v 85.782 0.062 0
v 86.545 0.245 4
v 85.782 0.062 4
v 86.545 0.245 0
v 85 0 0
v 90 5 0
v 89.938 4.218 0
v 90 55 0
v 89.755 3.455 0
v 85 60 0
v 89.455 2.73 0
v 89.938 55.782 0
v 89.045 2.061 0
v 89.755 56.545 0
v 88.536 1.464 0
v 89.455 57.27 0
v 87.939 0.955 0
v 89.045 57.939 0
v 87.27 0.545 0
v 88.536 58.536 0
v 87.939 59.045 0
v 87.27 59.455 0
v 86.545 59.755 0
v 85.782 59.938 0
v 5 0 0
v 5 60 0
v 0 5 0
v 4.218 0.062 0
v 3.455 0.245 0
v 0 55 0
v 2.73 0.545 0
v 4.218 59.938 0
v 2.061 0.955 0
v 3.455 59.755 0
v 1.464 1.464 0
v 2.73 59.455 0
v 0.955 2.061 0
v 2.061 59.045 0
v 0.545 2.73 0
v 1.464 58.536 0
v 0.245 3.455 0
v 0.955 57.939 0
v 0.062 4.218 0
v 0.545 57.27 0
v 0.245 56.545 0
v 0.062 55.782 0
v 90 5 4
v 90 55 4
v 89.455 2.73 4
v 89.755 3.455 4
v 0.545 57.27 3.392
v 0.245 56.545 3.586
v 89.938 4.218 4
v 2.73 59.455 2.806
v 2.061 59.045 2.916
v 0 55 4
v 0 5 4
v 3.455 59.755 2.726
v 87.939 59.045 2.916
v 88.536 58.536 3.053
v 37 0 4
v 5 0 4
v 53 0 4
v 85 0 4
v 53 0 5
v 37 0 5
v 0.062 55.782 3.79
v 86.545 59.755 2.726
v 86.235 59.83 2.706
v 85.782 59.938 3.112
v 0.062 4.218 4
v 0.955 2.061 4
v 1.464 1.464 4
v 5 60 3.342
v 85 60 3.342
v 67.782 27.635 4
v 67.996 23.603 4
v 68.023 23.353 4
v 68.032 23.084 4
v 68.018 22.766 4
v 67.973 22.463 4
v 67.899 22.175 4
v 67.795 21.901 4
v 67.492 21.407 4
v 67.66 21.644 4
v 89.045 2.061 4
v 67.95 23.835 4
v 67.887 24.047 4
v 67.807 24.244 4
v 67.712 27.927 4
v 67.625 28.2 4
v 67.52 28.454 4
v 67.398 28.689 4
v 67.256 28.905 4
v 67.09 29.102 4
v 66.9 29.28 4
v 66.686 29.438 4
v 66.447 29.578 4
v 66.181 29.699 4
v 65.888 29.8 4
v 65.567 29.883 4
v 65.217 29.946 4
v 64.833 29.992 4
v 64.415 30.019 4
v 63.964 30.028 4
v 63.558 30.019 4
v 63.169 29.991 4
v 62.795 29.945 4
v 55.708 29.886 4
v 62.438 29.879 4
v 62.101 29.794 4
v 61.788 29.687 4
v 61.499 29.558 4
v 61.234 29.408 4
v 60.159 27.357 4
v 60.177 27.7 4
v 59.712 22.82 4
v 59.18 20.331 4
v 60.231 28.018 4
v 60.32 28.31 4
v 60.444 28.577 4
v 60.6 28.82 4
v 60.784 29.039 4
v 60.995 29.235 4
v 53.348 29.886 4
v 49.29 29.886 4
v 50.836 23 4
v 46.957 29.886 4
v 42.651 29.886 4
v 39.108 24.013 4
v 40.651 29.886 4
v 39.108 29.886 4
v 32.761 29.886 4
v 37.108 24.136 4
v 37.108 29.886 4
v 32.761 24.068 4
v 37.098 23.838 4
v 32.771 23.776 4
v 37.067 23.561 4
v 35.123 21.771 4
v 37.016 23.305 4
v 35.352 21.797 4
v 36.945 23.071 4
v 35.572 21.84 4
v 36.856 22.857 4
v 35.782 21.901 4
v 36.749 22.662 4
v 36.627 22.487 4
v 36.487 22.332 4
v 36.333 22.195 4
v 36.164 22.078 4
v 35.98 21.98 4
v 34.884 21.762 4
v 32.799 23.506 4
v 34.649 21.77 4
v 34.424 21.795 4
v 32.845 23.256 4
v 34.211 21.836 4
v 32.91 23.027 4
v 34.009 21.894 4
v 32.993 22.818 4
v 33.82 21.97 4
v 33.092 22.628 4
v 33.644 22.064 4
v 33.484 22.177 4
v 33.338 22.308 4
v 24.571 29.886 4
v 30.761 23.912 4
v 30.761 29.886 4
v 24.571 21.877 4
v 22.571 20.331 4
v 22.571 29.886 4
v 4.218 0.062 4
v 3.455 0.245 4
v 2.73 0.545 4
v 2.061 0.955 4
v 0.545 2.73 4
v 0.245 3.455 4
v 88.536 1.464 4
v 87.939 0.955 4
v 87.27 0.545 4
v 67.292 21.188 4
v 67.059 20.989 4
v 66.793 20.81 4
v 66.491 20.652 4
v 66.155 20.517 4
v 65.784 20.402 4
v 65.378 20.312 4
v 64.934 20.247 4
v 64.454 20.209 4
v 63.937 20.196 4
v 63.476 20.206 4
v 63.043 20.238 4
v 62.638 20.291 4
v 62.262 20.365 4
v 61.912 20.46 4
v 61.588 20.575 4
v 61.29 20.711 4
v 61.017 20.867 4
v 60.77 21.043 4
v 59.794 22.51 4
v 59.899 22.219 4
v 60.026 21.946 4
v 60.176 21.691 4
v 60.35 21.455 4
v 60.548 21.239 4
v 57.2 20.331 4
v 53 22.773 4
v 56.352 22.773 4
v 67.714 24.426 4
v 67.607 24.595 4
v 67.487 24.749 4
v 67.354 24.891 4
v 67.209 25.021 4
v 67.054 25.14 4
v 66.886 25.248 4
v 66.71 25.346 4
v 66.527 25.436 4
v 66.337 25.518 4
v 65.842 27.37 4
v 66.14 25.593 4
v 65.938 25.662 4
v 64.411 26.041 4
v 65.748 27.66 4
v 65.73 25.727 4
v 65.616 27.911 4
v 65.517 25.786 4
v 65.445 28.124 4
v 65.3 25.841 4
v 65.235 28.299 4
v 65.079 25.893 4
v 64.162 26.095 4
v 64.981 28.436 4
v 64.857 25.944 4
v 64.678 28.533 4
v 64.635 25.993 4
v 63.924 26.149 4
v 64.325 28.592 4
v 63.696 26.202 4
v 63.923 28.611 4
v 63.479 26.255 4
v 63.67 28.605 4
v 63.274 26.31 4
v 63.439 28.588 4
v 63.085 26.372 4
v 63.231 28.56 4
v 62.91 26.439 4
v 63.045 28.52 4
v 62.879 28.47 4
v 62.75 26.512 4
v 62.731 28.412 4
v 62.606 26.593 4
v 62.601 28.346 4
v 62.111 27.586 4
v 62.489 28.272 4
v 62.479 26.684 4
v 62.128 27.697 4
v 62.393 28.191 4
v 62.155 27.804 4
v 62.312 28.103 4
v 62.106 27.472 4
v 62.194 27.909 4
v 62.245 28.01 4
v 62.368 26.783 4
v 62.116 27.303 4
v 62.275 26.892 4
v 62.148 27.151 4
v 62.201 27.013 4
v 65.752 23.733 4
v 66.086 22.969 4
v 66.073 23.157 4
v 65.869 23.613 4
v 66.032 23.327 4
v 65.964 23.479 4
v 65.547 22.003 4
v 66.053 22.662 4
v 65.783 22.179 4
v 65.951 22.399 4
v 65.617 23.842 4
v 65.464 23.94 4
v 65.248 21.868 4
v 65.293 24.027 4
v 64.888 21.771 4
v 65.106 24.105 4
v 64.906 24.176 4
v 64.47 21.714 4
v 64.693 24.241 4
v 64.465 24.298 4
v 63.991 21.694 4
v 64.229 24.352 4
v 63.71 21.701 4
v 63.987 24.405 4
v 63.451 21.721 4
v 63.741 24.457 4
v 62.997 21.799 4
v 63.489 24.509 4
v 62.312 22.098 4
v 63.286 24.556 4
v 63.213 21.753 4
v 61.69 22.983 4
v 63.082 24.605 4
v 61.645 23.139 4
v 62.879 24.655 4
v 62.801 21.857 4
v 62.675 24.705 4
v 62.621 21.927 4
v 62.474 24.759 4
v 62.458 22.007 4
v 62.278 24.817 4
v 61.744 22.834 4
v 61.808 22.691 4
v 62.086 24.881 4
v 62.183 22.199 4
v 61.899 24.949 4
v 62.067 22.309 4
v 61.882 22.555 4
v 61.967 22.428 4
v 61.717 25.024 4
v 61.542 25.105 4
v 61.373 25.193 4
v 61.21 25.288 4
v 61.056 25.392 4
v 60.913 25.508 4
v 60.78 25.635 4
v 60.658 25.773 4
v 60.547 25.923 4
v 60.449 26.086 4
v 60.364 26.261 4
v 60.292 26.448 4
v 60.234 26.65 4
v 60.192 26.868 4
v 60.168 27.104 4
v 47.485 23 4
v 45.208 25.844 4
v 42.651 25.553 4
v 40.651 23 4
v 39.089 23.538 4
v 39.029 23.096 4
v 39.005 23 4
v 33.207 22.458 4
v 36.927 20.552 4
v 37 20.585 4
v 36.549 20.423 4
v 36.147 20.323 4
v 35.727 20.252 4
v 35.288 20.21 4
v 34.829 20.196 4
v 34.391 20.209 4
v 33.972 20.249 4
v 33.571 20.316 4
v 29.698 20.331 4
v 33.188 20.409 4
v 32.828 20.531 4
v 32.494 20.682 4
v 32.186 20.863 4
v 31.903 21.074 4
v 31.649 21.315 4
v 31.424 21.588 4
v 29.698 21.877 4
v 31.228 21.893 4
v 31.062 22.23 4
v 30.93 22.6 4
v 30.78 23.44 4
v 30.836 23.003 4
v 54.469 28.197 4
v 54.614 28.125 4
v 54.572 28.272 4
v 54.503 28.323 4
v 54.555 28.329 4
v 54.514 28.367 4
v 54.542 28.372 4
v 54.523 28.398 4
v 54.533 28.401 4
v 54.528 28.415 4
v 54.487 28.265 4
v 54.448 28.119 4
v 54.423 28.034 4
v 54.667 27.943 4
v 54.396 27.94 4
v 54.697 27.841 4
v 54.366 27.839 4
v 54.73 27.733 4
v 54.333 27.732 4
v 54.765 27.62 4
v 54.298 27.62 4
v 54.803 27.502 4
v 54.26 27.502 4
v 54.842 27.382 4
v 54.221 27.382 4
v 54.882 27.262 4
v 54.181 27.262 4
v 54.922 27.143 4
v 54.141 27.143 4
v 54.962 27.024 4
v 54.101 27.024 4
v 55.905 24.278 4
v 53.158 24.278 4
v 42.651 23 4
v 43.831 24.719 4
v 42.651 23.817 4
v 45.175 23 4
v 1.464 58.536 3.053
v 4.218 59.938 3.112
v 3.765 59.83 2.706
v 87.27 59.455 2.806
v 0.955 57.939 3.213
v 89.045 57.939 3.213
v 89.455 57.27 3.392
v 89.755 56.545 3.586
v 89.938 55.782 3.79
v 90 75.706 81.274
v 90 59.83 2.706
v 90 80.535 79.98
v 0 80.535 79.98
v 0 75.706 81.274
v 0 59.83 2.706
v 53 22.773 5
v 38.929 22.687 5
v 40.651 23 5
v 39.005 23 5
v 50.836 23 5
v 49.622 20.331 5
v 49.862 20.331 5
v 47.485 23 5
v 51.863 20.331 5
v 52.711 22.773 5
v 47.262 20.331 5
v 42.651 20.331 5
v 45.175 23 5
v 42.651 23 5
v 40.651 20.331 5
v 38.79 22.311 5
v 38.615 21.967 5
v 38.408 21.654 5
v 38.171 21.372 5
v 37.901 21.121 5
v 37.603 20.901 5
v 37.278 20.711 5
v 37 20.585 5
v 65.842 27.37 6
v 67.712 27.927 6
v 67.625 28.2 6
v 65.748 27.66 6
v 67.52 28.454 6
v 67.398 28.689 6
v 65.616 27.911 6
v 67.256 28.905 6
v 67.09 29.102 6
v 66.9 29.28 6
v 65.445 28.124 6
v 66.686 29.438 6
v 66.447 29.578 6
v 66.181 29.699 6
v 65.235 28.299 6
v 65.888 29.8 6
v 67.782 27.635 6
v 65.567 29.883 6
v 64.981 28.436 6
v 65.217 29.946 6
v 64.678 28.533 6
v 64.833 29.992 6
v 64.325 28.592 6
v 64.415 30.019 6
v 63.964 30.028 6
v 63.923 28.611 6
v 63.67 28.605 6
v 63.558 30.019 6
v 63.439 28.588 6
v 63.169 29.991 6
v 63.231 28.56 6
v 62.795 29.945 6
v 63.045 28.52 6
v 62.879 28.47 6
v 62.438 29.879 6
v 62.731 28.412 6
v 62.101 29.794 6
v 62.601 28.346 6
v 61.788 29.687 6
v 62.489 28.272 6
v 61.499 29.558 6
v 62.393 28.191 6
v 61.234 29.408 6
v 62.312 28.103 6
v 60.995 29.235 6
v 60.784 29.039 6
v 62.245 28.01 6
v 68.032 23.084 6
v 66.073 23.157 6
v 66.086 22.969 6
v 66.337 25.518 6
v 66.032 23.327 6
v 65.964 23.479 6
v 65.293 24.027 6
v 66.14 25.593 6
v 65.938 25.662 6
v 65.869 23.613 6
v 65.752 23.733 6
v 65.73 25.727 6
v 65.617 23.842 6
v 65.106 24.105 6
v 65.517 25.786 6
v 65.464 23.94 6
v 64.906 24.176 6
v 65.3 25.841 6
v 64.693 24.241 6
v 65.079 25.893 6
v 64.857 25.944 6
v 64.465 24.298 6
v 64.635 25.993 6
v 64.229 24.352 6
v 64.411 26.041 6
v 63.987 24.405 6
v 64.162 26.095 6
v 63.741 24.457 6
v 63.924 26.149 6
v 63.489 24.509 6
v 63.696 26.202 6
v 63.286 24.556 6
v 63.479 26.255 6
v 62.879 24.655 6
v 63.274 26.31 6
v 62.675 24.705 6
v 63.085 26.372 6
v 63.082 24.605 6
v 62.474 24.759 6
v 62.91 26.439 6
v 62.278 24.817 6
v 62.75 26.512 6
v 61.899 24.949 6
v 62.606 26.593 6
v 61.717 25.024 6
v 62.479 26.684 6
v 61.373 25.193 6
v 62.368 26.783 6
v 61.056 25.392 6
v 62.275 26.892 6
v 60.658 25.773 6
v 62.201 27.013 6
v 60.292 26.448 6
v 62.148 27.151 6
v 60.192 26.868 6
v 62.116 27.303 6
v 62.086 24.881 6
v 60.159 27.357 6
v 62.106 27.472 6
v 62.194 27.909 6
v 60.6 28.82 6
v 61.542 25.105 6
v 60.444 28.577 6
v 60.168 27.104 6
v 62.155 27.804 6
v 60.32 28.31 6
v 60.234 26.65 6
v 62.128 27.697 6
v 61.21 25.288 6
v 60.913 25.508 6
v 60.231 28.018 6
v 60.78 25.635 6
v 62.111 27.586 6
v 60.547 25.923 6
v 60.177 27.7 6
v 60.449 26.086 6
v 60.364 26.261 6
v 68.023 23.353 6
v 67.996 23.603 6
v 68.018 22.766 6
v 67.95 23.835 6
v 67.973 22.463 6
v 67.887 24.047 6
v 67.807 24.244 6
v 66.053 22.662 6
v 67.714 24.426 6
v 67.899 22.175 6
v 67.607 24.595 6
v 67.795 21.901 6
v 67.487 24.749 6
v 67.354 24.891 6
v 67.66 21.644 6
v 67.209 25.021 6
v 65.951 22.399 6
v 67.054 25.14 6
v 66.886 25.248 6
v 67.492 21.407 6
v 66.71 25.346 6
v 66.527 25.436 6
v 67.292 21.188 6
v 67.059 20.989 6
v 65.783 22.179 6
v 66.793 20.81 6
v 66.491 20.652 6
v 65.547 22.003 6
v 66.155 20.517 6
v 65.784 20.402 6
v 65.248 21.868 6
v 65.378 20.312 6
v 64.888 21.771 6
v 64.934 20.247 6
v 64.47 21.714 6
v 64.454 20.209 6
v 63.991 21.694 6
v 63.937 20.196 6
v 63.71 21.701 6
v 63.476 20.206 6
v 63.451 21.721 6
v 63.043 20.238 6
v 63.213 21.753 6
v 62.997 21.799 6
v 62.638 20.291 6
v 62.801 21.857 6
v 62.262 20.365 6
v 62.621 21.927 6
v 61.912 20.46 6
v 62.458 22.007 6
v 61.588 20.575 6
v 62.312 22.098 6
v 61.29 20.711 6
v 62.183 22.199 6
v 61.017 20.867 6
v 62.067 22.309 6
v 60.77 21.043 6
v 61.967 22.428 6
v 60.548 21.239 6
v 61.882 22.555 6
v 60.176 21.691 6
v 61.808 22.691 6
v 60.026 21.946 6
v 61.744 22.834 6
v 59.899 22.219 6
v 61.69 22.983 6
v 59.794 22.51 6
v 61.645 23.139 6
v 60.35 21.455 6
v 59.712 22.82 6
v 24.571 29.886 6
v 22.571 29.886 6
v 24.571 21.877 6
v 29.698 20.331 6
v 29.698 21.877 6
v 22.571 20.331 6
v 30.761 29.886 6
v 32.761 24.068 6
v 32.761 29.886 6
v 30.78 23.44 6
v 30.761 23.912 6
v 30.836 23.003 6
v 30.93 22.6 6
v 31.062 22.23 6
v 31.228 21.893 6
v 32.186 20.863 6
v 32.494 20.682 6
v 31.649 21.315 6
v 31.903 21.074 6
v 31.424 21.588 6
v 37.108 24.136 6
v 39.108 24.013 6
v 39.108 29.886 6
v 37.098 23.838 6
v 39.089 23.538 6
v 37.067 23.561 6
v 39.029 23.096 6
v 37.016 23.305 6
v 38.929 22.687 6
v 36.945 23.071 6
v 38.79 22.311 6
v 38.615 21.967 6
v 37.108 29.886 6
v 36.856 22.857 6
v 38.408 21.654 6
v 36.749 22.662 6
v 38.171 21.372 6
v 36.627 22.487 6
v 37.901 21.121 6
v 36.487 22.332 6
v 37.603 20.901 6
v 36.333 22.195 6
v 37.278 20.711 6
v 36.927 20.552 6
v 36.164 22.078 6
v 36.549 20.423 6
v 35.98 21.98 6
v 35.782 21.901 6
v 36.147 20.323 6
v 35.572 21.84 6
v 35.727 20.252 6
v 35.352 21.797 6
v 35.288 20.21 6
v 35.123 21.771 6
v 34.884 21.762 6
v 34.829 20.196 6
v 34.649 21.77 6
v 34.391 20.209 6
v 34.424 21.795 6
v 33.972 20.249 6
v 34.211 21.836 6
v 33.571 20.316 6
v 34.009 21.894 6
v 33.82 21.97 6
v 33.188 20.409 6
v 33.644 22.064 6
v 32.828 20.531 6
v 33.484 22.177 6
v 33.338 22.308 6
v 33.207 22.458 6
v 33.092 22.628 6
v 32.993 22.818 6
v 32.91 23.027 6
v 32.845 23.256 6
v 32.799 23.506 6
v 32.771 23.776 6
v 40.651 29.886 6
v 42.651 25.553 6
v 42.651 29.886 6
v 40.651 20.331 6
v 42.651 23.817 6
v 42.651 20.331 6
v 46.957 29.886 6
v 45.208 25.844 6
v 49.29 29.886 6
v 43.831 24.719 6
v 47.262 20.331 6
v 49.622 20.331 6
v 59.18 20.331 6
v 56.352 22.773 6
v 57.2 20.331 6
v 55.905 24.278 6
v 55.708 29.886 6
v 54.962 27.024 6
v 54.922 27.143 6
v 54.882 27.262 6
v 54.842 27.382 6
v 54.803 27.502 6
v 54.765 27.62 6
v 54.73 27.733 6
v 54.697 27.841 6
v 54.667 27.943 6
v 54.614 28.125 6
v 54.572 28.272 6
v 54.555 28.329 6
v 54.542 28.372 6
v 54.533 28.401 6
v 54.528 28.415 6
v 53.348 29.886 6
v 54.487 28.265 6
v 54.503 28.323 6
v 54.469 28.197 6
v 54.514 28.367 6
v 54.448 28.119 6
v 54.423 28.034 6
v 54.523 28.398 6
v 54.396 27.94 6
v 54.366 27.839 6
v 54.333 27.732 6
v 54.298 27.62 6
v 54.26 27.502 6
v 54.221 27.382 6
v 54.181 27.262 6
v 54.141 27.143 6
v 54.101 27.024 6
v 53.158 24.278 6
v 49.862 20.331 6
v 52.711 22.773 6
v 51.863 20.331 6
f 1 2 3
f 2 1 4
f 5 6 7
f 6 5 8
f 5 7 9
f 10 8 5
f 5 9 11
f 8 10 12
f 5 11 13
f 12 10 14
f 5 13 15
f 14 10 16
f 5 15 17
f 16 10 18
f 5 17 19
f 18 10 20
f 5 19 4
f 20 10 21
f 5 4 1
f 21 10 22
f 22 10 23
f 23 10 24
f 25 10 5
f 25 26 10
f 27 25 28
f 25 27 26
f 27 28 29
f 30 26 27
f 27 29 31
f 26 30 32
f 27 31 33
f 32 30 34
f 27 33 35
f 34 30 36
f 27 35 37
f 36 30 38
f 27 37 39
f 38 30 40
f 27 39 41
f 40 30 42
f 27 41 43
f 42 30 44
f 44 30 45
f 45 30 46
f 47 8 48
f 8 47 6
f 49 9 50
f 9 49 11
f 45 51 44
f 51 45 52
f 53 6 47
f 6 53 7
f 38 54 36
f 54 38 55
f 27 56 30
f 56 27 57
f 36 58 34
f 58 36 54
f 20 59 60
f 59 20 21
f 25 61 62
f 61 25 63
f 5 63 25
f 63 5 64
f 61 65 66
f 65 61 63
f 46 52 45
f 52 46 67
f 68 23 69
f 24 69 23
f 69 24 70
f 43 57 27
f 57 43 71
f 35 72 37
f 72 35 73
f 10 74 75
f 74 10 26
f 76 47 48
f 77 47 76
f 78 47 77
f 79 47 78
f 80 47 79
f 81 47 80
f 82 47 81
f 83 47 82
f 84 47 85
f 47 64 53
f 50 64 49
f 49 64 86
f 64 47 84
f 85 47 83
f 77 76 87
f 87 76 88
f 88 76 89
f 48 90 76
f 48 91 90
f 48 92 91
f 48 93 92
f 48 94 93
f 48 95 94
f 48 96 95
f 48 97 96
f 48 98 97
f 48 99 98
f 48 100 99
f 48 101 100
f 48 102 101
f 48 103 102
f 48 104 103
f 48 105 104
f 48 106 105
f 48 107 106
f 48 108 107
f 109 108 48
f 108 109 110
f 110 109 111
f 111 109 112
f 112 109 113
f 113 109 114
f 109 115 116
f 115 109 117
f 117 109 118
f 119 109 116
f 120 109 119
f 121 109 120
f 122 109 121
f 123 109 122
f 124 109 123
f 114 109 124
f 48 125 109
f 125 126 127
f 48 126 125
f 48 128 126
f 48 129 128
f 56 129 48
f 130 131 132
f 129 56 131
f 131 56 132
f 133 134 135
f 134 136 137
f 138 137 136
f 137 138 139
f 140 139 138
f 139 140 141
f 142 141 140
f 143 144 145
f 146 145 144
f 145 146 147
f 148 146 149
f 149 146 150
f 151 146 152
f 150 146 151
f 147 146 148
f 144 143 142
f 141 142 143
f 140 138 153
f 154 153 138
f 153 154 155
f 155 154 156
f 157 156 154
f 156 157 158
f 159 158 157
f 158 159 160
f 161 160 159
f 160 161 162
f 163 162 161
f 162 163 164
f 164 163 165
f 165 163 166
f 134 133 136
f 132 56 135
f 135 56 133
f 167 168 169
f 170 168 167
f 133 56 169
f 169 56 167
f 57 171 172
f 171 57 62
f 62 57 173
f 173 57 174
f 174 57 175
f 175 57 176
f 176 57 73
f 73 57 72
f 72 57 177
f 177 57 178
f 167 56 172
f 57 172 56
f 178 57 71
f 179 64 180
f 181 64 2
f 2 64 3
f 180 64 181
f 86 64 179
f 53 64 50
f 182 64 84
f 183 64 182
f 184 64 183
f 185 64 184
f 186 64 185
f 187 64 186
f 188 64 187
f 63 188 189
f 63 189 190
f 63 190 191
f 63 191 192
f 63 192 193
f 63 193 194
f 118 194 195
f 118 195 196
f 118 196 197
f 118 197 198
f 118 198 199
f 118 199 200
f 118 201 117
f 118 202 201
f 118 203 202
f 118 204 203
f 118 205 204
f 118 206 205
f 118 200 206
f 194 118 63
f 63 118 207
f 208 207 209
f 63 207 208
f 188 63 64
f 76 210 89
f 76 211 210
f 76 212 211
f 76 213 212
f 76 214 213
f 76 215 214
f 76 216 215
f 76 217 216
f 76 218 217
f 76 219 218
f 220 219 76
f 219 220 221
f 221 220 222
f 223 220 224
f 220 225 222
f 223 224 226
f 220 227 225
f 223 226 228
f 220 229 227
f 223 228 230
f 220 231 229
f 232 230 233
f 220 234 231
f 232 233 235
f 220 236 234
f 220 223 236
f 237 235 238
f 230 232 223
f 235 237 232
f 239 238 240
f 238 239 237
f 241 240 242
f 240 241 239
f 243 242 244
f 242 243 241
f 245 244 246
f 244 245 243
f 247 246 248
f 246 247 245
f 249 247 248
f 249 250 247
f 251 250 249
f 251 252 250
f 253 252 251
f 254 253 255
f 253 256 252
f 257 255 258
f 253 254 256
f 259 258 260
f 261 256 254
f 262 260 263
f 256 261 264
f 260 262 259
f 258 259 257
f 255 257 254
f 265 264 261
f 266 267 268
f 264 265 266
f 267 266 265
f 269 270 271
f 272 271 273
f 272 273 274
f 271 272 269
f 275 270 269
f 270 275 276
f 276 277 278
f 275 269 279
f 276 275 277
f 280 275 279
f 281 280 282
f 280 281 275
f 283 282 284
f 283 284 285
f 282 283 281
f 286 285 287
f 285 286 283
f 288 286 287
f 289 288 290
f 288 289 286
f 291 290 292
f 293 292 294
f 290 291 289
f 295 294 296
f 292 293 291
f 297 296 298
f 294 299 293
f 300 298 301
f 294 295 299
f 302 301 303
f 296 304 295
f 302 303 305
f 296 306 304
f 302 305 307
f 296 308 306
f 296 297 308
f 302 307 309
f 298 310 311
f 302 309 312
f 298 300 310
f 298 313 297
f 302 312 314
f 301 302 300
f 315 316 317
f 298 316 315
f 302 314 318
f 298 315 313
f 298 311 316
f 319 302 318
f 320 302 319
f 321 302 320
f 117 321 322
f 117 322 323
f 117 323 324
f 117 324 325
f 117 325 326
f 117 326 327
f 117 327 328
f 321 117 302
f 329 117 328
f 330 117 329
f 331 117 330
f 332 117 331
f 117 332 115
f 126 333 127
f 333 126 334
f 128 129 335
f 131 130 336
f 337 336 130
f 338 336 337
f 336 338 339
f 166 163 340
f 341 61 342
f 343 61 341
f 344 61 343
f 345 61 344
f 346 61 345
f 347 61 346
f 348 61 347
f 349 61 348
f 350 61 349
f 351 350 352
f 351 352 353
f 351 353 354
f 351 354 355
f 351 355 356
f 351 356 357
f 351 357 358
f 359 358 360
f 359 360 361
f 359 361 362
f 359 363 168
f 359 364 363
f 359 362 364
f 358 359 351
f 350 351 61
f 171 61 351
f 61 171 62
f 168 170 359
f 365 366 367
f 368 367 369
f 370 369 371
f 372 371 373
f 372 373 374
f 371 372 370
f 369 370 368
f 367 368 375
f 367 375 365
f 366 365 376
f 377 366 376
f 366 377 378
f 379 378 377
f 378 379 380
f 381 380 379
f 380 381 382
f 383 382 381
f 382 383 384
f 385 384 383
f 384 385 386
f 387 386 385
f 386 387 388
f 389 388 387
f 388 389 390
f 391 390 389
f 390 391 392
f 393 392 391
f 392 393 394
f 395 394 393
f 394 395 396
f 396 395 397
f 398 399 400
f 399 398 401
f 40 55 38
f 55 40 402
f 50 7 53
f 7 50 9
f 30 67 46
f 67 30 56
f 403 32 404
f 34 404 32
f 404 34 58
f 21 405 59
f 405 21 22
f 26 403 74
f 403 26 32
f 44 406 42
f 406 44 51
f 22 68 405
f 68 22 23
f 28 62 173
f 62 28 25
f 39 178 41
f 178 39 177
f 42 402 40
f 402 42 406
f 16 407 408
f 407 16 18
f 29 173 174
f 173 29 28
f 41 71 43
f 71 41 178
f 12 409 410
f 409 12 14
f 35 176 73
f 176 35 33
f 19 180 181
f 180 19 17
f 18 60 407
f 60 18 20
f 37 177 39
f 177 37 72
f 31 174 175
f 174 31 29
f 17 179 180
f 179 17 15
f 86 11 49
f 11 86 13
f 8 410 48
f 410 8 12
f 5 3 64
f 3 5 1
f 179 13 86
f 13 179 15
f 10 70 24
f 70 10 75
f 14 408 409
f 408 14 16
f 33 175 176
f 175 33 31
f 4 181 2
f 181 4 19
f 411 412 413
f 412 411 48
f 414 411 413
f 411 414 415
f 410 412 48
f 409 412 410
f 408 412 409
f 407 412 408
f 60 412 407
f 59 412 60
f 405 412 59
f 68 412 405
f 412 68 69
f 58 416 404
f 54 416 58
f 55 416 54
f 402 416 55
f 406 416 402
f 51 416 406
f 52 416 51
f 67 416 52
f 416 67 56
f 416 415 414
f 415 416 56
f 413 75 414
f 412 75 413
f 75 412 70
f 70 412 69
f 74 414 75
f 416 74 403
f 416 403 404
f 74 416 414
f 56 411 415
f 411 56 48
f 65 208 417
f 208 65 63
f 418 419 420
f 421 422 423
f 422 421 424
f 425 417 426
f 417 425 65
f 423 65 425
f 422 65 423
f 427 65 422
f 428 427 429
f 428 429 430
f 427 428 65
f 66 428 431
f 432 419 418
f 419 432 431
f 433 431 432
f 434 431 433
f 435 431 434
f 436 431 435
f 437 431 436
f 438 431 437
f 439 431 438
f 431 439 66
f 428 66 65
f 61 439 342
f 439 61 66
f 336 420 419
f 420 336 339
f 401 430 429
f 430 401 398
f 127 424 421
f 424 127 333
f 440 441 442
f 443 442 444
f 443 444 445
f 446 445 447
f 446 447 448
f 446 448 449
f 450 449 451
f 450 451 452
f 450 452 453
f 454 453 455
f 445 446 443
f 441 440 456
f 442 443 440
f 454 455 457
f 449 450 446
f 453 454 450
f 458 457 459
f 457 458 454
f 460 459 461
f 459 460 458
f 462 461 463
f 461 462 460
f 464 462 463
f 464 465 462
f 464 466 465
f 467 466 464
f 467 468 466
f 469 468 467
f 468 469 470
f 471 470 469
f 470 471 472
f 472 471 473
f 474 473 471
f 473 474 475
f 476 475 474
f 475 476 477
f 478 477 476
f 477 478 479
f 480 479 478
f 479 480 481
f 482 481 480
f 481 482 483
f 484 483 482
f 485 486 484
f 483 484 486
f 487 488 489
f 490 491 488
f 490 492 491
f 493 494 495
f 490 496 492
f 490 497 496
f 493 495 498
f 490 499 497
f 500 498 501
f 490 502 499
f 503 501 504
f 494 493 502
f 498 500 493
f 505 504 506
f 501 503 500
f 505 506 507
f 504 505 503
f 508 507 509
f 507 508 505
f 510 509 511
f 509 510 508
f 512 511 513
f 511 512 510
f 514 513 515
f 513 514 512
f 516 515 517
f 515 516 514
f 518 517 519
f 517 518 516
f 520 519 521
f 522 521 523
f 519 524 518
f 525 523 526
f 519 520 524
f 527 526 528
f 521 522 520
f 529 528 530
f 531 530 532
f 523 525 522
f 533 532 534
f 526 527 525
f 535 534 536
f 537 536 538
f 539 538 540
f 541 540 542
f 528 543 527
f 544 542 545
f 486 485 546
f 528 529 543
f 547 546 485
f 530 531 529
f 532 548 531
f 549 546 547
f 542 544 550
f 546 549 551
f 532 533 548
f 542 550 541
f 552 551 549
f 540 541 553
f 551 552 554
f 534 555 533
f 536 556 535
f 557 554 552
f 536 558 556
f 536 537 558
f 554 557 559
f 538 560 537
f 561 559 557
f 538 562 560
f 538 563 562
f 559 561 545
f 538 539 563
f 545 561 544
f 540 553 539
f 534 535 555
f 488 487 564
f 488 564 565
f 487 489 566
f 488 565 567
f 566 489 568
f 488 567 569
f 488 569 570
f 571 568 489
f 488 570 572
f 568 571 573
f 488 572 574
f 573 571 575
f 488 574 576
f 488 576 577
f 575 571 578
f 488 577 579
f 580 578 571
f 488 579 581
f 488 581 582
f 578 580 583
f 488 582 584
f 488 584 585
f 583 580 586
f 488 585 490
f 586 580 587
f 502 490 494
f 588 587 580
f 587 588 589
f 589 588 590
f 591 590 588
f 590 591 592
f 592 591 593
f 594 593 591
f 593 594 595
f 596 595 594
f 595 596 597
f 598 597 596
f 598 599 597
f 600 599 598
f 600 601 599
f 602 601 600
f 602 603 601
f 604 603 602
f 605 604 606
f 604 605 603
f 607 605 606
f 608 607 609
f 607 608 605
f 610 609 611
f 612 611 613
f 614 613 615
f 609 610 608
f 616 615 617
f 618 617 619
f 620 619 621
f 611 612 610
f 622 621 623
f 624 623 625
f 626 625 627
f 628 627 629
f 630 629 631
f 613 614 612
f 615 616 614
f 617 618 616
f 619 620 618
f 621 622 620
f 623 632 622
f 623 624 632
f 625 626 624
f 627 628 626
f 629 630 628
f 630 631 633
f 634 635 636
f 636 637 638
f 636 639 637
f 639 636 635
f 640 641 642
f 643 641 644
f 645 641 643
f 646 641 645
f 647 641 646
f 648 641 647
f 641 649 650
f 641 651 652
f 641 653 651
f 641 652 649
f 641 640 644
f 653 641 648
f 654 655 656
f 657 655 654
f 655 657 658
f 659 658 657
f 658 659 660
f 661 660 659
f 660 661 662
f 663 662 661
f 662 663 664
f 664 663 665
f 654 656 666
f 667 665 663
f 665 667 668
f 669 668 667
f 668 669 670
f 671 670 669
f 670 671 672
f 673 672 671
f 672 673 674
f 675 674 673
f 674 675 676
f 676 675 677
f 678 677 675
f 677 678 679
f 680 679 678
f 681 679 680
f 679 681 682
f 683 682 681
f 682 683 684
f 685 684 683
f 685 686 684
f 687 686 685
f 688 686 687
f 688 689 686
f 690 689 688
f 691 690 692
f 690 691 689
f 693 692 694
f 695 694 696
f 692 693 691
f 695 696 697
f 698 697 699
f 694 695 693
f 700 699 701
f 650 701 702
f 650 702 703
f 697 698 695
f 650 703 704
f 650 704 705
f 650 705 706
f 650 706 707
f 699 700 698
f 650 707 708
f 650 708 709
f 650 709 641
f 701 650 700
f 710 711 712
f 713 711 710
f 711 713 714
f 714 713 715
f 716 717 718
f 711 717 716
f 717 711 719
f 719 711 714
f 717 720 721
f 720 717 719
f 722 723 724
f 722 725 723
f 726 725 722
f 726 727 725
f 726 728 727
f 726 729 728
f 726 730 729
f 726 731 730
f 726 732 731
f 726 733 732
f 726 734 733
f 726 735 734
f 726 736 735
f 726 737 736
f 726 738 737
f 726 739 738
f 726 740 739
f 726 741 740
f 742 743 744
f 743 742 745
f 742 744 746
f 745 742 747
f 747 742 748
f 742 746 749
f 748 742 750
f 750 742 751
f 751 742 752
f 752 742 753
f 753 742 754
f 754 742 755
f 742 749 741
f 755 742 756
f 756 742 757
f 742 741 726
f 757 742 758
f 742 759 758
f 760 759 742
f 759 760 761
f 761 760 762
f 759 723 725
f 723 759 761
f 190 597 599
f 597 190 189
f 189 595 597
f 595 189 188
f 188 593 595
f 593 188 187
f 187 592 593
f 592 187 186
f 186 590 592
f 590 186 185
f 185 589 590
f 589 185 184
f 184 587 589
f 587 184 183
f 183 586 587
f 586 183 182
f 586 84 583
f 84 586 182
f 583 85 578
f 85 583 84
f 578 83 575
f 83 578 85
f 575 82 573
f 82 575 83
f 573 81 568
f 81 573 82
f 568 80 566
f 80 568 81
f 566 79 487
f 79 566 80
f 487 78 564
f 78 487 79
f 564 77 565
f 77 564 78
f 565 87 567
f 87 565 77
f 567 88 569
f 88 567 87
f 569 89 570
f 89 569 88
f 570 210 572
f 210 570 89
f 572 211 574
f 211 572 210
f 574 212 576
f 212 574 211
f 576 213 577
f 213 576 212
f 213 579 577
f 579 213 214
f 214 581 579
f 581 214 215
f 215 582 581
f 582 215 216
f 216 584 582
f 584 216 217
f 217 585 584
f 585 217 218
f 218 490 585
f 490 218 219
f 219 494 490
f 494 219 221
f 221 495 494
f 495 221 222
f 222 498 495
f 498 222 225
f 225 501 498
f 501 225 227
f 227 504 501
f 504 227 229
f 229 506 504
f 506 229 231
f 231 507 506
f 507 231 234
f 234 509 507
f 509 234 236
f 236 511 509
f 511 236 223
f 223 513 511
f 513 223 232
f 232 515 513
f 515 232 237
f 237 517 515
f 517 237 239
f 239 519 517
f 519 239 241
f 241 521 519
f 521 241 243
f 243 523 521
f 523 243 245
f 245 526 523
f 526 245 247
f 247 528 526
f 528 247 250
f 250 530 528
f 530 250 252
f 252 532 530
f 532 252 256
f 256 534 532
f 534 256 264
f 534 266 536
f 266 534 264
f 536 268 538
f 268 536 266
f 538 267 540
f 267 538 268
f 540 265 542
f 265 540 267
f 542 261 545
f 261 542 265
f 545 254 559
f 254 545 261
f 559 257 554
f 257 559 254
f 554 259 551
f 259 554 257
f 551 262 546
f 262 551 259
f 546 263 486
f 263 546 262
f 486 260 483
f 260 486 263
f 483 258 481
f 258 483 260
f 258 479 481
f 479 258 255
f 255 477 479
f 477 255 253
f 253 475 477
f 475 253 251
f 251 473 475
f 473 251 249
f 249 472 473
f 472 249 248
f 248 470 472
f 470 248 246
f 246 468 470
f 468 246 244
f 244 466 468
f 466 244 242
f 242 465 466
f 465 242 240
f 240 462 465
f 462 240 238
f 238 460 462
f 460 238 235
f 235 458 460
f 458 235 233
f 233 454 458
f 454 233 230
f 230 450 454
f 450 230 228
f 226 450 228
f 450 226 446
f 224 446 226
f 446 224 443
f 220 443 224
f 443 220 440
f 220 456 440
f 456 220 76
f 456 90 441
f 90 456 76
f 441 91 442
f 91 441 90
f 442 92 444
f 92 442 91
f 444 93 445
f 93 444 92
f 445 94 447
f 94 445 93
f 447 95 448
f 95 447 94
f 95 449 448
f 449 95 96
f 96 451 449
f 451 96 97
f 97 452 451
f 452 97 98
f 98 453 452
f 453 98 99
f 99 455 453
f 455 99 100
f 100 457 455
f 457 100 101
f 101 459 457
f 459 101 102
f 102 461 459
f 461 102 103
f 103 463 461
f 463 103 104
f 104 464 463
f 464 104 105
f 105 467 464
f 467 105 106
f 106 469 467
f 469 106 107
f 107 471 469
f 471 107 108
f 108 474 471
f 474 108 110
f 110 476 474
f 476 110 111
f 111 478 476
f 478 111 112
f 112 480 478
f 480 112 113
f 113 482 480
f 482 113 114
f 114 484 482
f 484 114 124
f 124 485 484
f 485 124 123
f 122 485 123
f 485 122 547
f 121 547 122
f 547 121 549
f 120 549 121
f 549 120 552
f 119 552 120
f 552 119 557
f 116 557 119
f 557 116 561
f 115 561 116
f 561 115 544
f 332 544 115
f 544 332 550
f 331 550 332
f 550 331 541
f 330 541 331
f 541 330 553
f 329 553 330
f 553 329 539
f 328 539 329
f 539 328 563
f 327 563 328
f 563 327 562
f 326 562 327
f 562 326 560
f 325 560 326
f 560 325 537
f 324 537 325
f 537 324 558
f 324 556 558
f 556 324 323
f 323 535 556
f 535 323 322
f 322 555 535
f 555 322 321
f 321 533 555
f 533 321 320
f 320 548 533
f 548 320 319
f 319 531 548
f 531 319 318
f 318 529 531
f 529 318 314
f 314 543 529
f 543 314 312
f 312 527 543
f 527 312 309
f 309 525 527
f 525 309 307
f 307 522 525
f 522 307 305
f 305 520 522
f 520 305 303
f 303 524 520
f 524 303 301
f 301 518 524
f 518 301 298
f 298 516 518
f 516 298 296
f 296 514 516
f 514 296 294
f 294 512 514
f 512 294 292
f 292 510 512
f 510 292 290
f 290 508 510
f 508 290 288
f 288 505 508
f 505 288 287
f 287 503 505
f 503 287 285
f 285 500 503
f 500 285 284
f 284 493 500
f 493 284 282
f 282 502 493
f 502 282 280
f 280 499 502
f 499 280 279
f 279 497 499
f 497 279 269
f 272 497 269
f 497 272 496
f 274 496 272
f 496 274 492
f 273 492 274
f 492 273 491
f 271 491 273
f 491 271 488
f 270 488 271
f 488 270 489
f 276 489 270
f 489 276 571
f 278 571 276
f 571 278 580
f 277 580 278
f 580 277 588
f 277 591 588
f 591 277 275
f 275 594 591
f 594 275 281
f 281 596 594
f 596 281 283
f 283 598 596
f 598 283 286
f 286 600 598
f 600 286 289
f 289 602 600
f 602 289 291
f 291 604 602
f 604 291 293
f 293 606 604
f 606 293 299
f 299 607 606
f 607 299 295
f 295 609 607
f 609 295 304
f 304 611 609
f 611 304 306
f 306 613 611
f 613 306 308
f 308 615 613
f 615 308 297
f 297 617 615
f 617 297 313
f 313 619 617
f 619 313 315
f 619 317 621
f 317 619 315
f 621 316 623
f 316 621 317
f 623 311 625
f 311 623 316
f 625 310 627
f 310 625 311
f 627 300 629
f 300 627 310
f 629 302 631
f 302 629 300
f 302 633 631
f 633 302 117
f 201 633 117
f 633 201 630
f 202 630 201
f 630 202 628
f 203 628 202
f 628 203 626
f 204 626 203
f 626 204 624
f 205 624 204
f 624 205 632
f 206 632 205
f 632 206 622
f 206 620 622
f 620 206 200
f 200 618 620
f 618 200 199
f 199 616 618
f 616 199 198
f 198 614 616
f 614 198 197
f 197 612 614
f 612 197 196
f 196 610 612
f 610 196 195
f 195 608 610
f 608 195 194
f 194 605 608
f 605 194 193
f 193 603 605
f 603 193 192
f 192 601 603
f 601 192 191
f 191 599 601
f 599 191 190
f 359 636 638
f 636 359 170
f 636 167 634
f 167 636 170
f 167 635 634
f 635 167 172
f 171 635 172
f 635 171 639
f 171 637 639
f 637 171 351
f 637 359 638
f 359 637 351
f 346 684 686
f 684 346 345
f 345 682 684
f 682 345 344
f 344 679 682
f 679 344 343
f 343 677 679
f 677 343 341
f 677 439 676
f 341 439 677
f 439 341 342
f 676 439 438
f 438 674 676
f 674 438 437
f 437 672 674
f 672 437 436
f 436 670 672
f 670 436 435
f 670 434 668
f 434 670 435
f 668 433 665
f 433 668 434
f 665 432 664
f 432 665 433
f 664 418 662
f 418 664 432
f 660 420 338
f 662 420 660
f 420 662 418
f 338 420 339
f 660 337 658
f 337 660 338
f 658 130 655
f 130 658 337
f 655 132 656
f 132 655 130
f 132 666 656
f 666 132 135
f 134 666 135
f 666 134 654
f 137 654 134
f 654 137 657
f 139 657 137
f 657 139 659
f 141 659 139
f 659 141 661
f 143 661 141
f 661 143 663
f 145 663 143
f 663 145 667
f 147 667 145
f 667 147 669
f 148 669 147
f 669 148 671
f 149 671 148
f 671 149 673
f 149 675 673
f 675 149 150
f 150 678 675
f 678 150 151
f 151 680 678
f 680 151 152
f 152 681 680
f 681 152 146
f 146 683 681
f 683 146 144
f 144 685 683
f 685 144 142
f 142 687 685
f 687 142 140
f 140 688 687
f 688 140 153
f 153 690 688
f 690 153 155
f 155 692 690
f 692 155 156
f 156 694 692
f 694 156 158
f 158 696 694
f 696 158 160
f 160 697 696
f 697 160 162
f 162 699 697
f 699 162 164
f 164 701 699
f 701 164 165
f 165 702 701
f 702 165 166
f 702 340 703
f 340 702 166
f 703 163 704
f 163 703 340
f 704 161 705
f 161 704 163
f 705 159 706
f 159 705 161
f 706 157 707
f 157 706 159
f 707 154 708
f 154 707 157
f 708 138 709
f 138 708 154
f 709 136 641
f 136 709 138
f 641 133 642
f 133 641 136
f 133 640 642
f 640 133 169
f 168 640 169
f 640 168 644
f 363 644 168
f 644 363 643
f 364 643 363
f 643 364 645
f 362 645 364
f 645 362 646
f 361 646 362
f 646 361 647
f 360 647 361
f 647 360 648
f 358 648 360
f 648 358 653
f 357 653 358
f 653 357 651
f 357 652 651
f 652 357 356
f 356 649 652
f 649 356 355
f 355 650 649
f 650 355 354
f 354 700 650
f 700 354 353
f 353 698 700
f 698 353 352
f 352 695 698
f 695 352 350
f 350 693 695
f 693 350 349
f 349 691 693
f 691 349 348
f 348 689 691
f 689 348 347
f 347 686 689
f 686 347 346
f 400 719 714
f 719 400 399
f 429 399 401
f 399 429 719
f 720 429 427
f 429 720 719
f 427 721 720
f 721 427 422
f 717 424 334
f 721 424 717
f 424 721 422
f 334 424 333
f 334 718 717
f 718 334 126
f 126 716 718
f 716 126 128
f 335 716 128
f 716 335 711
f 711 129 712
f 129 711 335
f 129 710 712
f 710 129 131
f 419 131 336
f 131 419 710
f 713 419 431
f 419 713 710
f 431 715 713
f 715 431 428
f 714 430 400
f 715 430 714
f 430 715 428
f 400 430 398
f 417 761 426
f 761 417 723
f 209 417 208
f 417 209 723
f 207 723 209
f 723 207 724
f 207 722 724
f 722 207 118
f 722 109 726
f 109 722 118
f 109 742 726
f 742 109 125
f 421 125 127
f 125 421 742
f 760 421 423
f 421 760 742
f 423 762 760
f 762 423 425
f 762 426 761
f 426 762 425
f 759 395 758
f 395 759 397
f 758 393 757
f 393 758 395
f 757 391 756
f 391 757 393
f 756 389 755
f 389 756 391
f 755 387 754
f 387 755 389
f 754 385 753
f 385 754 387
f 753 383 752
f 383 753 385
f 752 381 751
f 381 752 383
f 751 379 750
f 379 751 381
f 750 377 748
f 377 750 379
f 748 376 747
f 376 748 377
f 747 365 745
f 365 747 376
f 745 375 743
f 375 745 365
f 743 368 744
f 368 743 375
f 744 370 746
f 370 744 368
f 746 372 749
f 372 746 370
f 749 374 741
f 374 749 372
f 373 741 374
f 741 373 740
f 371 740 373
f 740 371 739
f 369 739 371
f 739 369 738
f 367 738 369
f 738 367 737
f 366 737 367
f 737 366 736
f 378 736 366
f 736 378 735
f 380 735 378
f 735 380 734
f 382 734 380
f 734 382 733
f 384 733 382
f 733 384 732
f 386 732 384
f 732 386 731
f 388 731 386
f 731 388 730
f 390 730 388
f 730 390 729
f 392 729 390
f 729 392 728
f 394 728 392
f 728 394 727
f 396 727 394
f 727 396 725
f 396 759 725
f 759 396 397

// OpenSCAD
// Phone Stand - Test Print
// Designed for Bambu P1S with PLA

// --- Settings ---
base_width = 90;
base_depth = 60;
base_height = 4;

back_height = 80;
back_thickness = 5;
back_angle = 15; // degrees tilted back

groove_width = 16; // iPhone 16 Pro Max with case
groove_depth = 3;
groove_pos = 18; // from front

corner_radius = 5;

// --- Base ---
module rounded_box(w, d, h, r) {
    hull() {
        translate([r, r, 0]) cylinder(r=r, h=h, $fn=40);
        translate([w-r, r, 0]) cylinder(r=r, h=h, $fn=40);
        translate([r, d-r, 0]) cylinder(r=r, h=h, $fn=40);
        translate([w-r, d-r, 0]) cylinder(r=r, h=h, $fn=40);
    }
}

// Base plate
rounded_box(base_width, base_depth, base_height, corner_radius);

// Back support (angled)
translate([0, base_depth - back_thickness, base_height])
rotate([-back_angle, 0, 0])
    cube([base_width, back_thickness, back_height]);

// Phone groove (slot to hold phone)
translate([(base_width - groove_width) / 2, 0, base_height - groove_depth])
    cube([groove_width, groove_pos + 5, groove_depth + 1]);

// --- Name on base ---
translate([base_width / 2, base_depth / 2 - 5, base_height])
    linear_extrude(height = 2)
        text("LUKAS", size = 10, font = "Liberation Sans:style=Bold",
             halign = "center", valign = "center");
